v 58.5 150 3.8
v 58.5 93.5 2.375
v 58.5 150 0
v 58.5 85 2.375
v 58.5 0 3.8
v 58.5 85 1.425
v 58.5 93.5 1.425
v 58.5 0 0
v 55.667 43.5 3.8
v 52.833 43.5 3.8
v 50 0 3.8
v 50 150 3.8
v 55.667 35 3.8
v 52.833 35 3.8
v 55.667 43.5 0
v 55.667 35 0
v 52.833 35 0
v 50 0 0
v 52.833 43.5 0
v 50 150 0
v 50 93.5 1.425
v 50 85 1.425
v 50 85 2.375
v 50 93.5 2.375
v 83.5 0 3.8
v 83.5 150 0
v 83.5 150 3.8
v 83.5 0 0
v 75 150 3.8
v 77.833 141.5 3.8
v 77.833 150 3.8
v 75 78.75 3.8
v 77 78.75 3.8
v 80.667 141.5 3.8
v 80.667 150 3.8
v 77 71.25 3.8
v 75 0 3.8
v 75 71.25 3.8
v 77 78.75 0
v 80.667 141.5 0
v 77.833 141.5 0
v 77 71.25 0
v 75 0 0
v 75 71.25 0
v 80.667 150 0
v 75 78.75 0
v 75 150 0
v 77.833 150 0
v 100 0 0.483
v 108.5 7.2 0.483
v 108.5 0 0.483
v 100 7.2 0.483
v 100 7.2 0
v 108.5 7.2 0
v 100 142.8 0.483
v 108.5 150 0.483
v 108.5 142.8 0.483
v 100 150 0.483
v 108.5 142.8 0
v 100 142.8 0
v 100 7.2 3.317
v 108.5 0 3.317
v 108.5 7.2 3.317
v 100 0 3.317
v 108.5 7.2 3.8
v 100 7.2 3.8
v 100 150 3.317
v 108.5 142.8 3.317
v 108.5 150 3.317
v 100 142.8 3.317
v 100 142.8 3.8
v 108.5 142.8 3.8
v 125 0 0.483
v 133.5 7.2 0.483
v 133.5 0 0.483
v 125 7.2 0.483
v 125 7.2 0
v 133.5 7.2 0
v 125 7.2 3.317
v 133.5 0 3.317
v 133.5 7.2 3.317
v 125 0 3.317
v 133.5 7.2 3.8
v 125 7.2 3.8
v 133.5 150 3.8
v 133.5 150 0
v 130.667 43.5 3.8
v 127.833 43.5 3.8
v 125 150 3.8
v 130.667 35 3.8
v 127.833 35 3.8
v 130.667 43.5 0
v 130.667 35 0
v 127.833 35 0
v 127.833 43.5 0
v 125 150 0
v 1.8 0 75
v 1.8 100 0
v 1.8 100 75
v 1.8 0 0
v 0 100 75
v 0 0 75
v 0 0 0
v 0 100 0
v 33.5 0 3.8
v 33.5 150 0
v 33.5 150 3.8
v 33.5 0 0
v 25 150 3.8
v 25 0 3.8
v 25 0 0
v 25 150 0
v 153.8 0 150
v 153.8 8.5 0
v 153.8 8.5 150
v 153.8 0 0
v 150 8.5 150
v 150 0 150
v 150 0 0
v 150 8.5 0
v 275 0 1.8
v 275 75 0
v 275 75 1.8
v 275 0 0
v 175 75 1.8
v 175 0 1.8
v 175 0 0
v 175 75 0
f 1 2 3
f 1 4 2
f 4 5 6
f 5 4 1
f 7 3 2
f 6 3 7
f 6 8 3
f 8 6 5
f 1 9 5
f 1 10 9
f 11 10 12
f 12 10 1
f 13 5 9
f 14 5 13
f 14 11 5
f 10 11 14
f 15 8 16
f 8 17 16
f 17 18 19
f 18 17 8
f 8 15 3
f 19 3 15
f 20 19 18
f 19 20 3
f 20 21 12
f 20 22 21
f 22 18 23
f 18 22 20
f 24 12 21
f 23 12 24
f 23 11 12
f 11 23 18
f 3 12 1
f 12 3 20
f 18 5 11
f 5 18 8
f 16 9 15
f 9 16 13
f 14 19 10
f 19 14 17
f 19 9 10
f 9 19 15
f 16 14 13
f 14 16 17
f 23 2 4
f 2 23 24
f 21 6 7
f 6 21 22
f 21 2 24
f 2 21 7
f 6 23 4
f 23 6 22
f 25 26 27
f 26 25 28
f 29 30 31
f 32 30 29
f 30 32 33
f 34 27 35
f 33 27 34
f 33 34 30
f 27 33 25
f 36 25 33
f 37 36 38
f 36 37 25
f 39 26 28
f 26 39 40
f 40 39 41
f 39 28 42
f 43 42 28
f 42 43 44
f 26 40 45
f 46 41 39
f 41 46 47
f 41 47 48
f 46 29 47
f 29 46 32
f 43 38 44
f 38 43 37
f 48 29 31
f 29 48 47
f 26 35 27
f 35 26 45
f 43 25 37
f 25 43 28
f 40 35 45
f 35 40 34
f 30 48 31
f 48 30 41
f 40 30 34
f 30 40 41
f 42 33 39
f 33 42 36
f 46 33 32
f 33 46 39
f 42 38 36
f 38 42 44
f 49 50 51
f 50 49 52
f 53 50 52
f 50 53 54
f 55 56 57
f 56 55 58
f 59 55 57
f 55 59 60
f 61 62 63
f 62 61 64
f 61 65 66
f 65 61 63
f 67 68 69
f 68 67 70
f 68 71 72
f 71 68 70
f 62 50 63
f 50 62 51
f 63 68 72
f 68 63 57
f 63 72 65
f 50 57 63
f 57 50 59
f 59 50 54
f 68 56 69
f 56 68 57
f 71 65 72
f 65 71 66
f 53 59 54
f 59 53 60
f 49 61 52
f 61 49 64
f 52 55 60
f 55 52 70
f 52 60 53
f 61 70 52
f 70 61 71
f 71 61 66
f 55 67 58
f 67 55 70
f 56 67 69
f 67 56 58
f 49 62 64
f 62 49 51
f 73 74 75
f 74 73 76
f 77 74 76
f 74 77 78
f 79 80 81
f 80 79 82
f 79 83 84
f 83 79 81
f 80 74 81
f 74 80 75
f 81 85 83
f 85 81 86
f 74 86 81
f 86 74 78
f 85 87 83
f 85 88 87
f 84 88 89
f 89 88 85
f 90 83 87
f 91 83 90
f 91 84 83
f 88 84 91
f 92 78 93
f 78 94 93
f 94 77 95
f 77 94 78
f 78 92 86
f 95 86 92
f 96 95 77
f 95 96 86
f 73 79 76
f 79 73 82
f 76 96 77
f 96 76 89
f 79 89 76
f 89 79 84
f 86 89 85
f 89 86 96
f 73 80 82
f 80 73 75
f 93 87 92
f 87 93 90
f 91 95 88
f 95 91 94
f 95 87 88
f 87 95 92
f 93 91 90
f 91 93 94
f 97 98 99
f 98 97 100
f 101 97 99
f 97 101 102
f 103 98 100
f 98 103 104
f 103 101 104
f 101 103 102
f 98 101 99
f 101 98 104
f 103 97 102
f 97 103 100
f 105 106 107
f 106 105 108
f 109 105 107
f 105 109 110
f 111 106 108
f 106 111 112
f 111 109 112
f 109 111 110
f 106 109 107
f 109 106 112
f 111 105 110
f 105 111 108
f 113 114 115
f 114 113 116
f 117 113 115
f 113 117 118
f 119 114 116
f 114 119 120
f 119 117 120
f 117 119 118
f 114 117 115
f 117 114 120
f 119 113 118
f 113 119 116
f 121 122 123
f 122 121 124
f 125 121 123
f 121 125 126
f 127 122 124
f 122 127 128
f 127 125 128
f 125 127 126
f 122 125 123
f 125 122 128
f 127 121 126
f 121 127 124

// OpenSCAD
// file: general/tenon.scad
include<functions.scad>

// TENON - cut away tenon cheeks on a child, symmetrically about one axis.
// Note: tenon width is assumed to be the whole board width. Manupulating the 
// children_bounds to reduce the width of the tenon will result in an error, because 
// of renderer compensation delta factor.
// children_bounds - must be an array either [xmax, ymax, zmax] or 
//   [xmin, xmax, ymin, ymax, zmin, zmax]. The shorter list assumes min values are all 0.
// d_along, foo_da: 
//   d_along = "x", "y" or "z" - the long dimension _along which_ the tenon should be placed.
//   tenon_length_da: the length of the tenon (in units of d_along).
//   both_ends_da = true, "+" or "-". + indicates the end where d_along coord is larger.
// d_across, foo_dt:
//   d_across = "x", "y", "z" - the dimension perpendicular to d_along, but still parallel 
//     to the tenon's cheek.
//   tenon_thickness_dt = the thickness, (in units of the remaining dimension) of the tenon after cutting.

module tenon(children_bounds, d_along, tenon_length_da, both_ends_da, d_across, tenon_thickness_dt) {

    delta = 0.01;

    if (d_along != d_across && valid_dimension(d_along) && valid_dimension(d_across)) {

        // d_through without the +/-.
        known_ds = [d_along, d_across];
        d_symmetry = !in("x", known_ds) ? "x" : (!in("y", known_ds) ? "y" : "z");
        echo("debug", d_along=d_along, d_across=d_across, d_symmetry=d_symmetry);

        xmin = len(children_bounds) == 6 ? children_bounds[0] : 0;
        ymin = len(children_bounds) == 6 ? children_bounds[2] : 0;
        zmin = len(children_bounds) == 6 ? children_bounds[4] : 0;

        xmax = len(children_bounds) == 6 ? children_bounds[1] : children_bounds[0];
        ymax = len(children_bounds) == 6 ? children_bounds[3] : children_bounds[1];
        zmax = len(children_bounds) == 6 ? children_bounds[5] : children_bounds[2];

        child_size = [xmax-xmin, ymax-ymin, zmax-zmin];

        if (len([for (i = child_size) if (i <= 0) i]) == 0) {
            // create a 6-len "children_bounds" modified so that it reads (along, through, depth) by dimensions. We use this to calculate the mortice offset and size.
            frame_bounds = [
                d_along == "x" ? xmin : (d_along == "y" ? ymin : zmin),
                d_along == "x" ? xmax : (d_along == "y" ? ymax : zmax),
                d_across == "x" ? xmin : (d_across == "y" ? ymin : zmin),
                d_across == "x" ? xmax : (d_across == "y" ? ymax : zmax),
                d_symmetry == "x" ? xmin : (d_symmetry == "y" ? ymin : zmin),
                d_symmetry == "x" ? xmax : (d_symmetry == "y" ? ymax : zmax),
            ];

            d_along_min_tenon = (both_ends_da == true || both_ends_da == "-");
            d_along_max_tenon = (both_ends_da == true || both_ends_da == "+");

            echo("debug", d_along_min_tenon=d_along_min_tenon, d_along_max_tenon=d_along_max_tenon);

            // for each possible tenon, compute the cuts:
            // Possible Tenon cuts:
            // X     | -along | +along
            // -symm |   A    |   B
            // +symm |   C    |   D

            child_along_size = frame_bounds[1] - frame_bounds[0];
            child_across_size = frame_bounds[3] - frame_bounds[2];
            child_symmetry_size = frame_bounds[5] - frame_bounds[4];

            // All cuts share the same size.
            along_size = tenon_length_da + delta;
            across_size = child_across_size + 2*delta;
            symmetry_size = (child_symmetry_size - tenon_thickness_dt) / 2 + delta;

            // Use size in ternary expressions to turn cuts on/off:
            common_size = [
                d_along == "x" ? along_size : (d_across == "x" ? across_size : symmetry_size),
                d_along == "y" ? along_size : (d_across == "y" ? across_size : symmetry_size),
                d_along == "z" ? along_size : (d_across == "z" ? across_size : symmetry_size)
            ];
            zero_size = [0, 0, 0];

            // A offsets:
            A_along_off = -delta;
            A_across_off = -delta;
            A_symmetry_off = -delta;

            // B offsets:
            B_along_off = child_along_size + delta - along_size;
            B_across_off = -delta;
            B_symmetry_off = -delta;

            // C offsets:
            C_along_off = -delta;
            C_across_off = -delta;
            C_symmetry_off = child_symmetry_size + delta - symmetry_size;

            // D offsets:
            D_along_off = child_along_size + delta - along_size;
            D_across_off = -delta;
            D_symmetry_off = child_symmetry_size + delta - symmetry_size;

            A_size = d_along_min_tenon ? common_size : zero_size;
            B_size = d_along_max_tenon ? common_size : zero_size;
            C_size = d_along_min_tenon ? common_size : zero_size;
            D_size = d_along_max_tenon ? common_size : zero_size;

            A_off = [
                d_along == "x" ? A_along_off : (d_across == "x" ? A_across_off : A_symmetry_off),
                d_along == "y" ? A_along_off : (d_across == "y" ? A_across_off : A_symmetry_off),
                d_along == "z" ? A_along_off : (d_across == "z" ? A_across_off : A_symmetry_off),
            ];
            B_off = [
                d_along == "x" ? B_along_off : (d_across == "x" ? B_across_off : B_symmetry_off),
                d_along == "y" ? B_along_off : (d_across == "y" ? B_across_off : B_symmetry_off),
                d_along == "z" ? B_along_off : (d_across == "z" ? B_across_off : B_symmetry_off),
            ];
            C_off = [
                d_along == "x" ? C_along_off : (d_across == "x" ? C_across_off : C_symmetry_off),
                d_along == "y" ? C_along_off : (d_across == "y" ? C_across_off : C_symmetry_off),
                d_along == "z" ? C_along_off : (d_across == "z" ? C_across_off : C_symmetry_off),
            ];
            D_off = [
                d_along == "x" ? D_along_off : (d_across == "x" ? D_across_off : D_symmetry_off),
                d_along == "y" ? D_along_off : (d_across == "y" ? D_across_off : D_symmetry_off),
                d_along == "z" ? D_along_off : (d_across == "z" ? D_across_off : D_symmetry_off),
            ];

            echo("debug A", A_size=A_size, A_off=A_off);
            echo("debug B", B_size=B_size, B_off=B_off);
            echo("debug C", C_size=C_size, C_off=C_off);
            echo("debug D", D_size=D_size, D_off=D_off);

            difference() {
                union() {
                    children();
                }
                union() {
                    translate(A_off)
                        cube(A_size);
                    translate(B_off)
                        cube(B_size);
                    translate(C_off)
                        cube(C_size);
                    translate(D_off)
                        cube(D_size);
                }
            }
        }
        else {
            echo("WARNING: invalid bounds passed to tenon():", children_bounds=children_bounds);
        }
    }
    else {
        echo("WARNING: invalid dimensions passed to tenon():", d_along=d_along, d_through=d_through);
    }
}
// file: general/mortice.scad
include<functions.scad>

// MORTICE - cut a mortice into a child object, centrally in one dimension (the one you don't specify in args).
// children_bounds - must be an array either [xmax, ymax, zmax] or 
//   [xmin, xmax, ymin, ymax, zmin, zmax]. The shorter list assumes min values are all 0.
// rule: a constant which helps specify which moritce coordinates to use.
//   rule can be a string from {"thirds" (more rules?)}, or can be a number 0<x<1 being the 
//   fraction of the child that should be cut away (e.g. "thirds" would be 0.333..).
// d_along, foo_da: 
//   d_along = "x", "y" or "z" - the long dimension _along which_ the mortice should be placed.
//   offset_da: the offset (in units of +d_along) where the start of the mortice cut should be.
//   length_da: the length of the mortice cut (in units of d_along) along d_along.
// d_through, foo_dt:
//   d_through = "x", "y", "z", "-x", "-y", "-z" - the dimension along which to cut through the 
//     child. Negative dimensions means you cut from the side where d_through is a larger coord 
//     value (this is only needed if depth_dt is less than all the way through the child.)
//   depth_dt = the depth, (in units of +d_through) of the mortice. if undefined or zero or 
//     negative then it is assumed 100% depth.
module mortice(children_bounds, rule, d_along, offset_da, length_da, d_through, depth_dt) {

    delta = 0.01;

    if (d_along != d_through && valid_dimension(d_along) && valid_edimension(d_through)) {

        // d_through without the +/-.
        d_depth = in(d_through, ["x", "-x"]) ? "x" : (in(d_through, ["y", "-y"]) ? "y" : "z");
        depth_is_positive = valid_dimension(d_through);
        known_ds = [d_along, d_depth];
        d_symmetry = !in("x", known_ds) ? "x" : (!in("y", known_ds) ? "y" : "z");

        xmin = len(children_bounds) == 6 ? children_bounds[0] : 0;
        ymin = len(children_bounds) == 6 ? children_bounds[2] : 0;
        zmin = len(children_bounds) == 6 ? children_bounds[4] : 0;

        xmax = len(children_bounds) == 6 ? children_bounds[1] : children_bounds[0];
        ymax = len(children_bounds) == 6 ? children_bounds[3] : children_bounds[1];
        zmax = len(children_bounds) == 6 ? children_bounds[5] : children_bounds[2];

        child_size = [xmax-xmin, ymax-ymin, zmax-zmin];

        if (len([for (i = child_size) if (i <= 0) i]) == 0) {
            // create a 6-len "children_bounds" modified so that it reads (along, through, depth) by dimensions. We use this to calculate the mortice offset and size.
            frame_bounds = [
                d_along == "x" ? xmin : (d_along == "y" ? ymin : zmin),
                d_along == "x" ? xmax : (d_along == "y" ? ymax : zmax),
                d_depth == "x" ? xmin : (d_depth == "y" ? ymin : zmin),
                d_depth == "x" ? xmax : (d_depth == "y" ? ymax : zmax),
                d_symmetry == "x" ? xmin : (d_symmetry == "y" ? ymin : zmin),
                d_symmetry == "x" ? xmax : (d_symmetry == "y" ? ymax : zmax),
            ];

            along_off = offset_da + frame_bounds[0];
            along_size = length_da;

            child_depth_size = frame_bounds[3] - frame_bounds[2];
            depth_specified = (depth_dt != undef) && (depth_dt > 0);

            depth_size = depth_specified ? depth_dt + delta : child_depth_size + 2*delta;
            depth_off = depth_is_positive ?  frame_bounds[2] -delta : frame_bounds[2] + child_depth_size + delta - depth_size;

            symmetry_fraction = (rule == "thirds") ? 1/3 : rule;
            child_symmetry_size = frame_bounds[5] - frame_bounds[4];
            symmetry_size = child_symmetry_size * symmetry_fraction;
            symmetry_off = (child_symmetry_size - symmetry_size) / 2 + frame_bounds[4];
            
            mortice_size = [
                d_along == "x" ? along_size : (d_depth == "x" ? depth_size : symmetry_size),
                d_along == "y" ? along_size : (d_depth == "y" ? depth_size : symmetry_size),
                d_along == "z" ? along_size : (d_depth == "z" ? depth_size : symmetry_size),
            ];

            mortice_offset = [
                d_along == "x" ? along_off : (d_depth == "x" ? depth_off : symmetry_off),
                d_along == "y" ? along_off : (d_depth == "y" ? depth_off : symmetry_off),
                d_along == "z" ? along_off : (d_depth == "z" ? depth_off : symmetry_off),
            ];

            echo("mortice_params", mortice_size=mortice_size, mortice_offset=mortice_offset);

            difference() {
                union() {
                    children();
                }
                union() {
                    translate(mortice_offset)
                        cube(mortice_size);
                }
            }
        }
        else {
            echo("WARNING: invalid bounds passed to mortice():", children_bounds=children_bounds);
        }
    }
    else {
        echo("WARNING: invalid dimensions passed to mortice():", d_along=d_along, d_through=d_through);
    }
}
// file: general/sheet.scad
include<functions.scad>

module sheet(length, width, thickness, d_len, d_wid, colour) {
    // We need to define a sheet (cube), and ensure that length is used as the d_len (x, y, or z) dimension.
    // and that width is used as the d_wid (x, y, or z) dimension.

    if (d_len != d_wid && valid_dimension(d_len) && valid_dimension(d_wid)) {
        as_vec = [length, width, thickness];

        x_index = d_len == "x" ? 0 : d_wid == "x" ? 1 : 2;
        y_index = d_len == "y" ? 0 : d_wid == "y" ? 1 : 2;
        z_index = d_len == "z" ? 0 : d_wid == "z" ? 1 : 2;

        colour_val = colour == undef ? "#F7F1DE" : colour;

        color(colour_val)
        cube([as_vec[x_index], as_vec[y_index], as_vec[z_index]], center=false);
    }
    else {
        echo("WARNING: invalid sheet() call with ", d_len=d_len, d_wid=d_wid);
    }
}
// file: general/plank.scad
include<functions.scad>

// You can specify length, width and depth in decending size order (e.g. 244, 8.9, 3.8), and then specify d_len and d_wid to orient the board.
module plank(length, width, depth, d_len, d_wid, colour) {
    // We need to define a plank (cube), and ensure that length is used as the d_len (x, y, or z) dimension.
    // and that width is used as the d_wid (x, y, or z) dimension.

    if (d_len != d_wid && valid_dimension(d_len) && valid_dimension(d_wid)) {
        as_vec = [length, width, depth];

        x_index = d_len == "x" ? 0 : d_wid == "x" ? 1 : 2;
        y_index = d_len == "y" ? 0 : d_wid == "y" ? 1 : 2;
        z_index = d_len == "z" ? 0 : d_wid == "z" ? 1 : 2;

        colour_val = colour == undef ? "#9D6638" : colour;

        color(colour_val)
        cube([as_vec[x_index], as_vec[y_index], as_vec[z_index]], center=false);
    }
    else {
        echo("WARNING: invalid plank() call with ", d_len=d_len, d_wid=d_wid);
    }
}
// file: general/functions.scad
// PRIVATE
// (private) returns a comparitor function that searches for a value.
function _equals(a) = function (b) a == b;

__valid_dimensions = ["x", "y", "z"];
__valid_extended_dimensions = ["x", "y", "z", "-x", "-y", "-z"];

// PUBLIC (general)
// true if the test function passes for any item in the `set` list.
function any(set, test) = len([for (i = set) if (test(i)) i]) > 0;

// All seems to be buggy...
// // true if the test function passes for all items in the `set` list.
function all(set, test) = len([for (i = set) if (!test(i)) i]) == 0;

// true if items is contained within the list `set`.
function in(item, set) = any(set, _equals(item));

// test function which is true if x > 0, good for composing with any and all.
function positive(num) = num > 0;


// APP-SPECIFIC
// application-specific functions
function valid_dimension(val) = in(val, __valid_dimensions);
function valid_edimension(val) = in(val, __valid_extended_dimensions);
// main file
include<general/functions.scad>
include<general/plank.scad>
include<general/sheet.scad>
include<general/mortice.scad>
include<general/tenon.scad>

module demo() {
    xoff = 25;
    translate([xoff*0, 0, 0]) {
        sheet(100, 75, 1.8, "y", "z");
    }
    translate([xoff*1, 0, 0]) {
        plank(150, 8.5, 3.8, "y", "x");
    }
    translate([xoff*2, 0, 0]) {
        mortice([8.5, 150, 3.8], 0.25, "y", 85, 8.5, "x") {
            mortice([8.5, 150, 3.8], "thirds", "y", 35, 8.5, "z") {
                plank(150, 8.5, 3.8, "y", "x");
            }
        }
    }
    translate([xoff*3, 0, 0]) {
        mortice([8.5, 150, 3.8], 0.05, "x", -0.01, 2.01, "z") {
            mortice([8.5, 150, 3.8], "thirds", "y", 150-8.5, 8.6, "z") {
                plank(150, 8.5, 3.8, "y", "x");
            }
        }
    }
    translate([xoff*4, 0, 0]) {
        tenon([8.5, 150, 3.8], "y", 7.2, true, "x", 8.5/3) {
            plank(150, 8.5, 3.8, "y", "x");
        }
    }
    translate([xoff*5, 0, 0]) {
        mortice([8.5, 150, 3.8], "thirds", "y", 35, 8.5, "z") {
            tenon([8.5, 150, 3.8], "y", 7.2, "-", "x", 8.5/3) {
                plank(150, 8.5, 3.8, "y", "x");
            }
        }
    }
    translate([xoff*6, 0, 0]) {
        plank(150, 8.5, 3.8, "z", "y");
    }
    translate([xoff*7, 0, 0]) {
        sheet(100, 75, 1.8, "x", "y");
    }
}

demo();
